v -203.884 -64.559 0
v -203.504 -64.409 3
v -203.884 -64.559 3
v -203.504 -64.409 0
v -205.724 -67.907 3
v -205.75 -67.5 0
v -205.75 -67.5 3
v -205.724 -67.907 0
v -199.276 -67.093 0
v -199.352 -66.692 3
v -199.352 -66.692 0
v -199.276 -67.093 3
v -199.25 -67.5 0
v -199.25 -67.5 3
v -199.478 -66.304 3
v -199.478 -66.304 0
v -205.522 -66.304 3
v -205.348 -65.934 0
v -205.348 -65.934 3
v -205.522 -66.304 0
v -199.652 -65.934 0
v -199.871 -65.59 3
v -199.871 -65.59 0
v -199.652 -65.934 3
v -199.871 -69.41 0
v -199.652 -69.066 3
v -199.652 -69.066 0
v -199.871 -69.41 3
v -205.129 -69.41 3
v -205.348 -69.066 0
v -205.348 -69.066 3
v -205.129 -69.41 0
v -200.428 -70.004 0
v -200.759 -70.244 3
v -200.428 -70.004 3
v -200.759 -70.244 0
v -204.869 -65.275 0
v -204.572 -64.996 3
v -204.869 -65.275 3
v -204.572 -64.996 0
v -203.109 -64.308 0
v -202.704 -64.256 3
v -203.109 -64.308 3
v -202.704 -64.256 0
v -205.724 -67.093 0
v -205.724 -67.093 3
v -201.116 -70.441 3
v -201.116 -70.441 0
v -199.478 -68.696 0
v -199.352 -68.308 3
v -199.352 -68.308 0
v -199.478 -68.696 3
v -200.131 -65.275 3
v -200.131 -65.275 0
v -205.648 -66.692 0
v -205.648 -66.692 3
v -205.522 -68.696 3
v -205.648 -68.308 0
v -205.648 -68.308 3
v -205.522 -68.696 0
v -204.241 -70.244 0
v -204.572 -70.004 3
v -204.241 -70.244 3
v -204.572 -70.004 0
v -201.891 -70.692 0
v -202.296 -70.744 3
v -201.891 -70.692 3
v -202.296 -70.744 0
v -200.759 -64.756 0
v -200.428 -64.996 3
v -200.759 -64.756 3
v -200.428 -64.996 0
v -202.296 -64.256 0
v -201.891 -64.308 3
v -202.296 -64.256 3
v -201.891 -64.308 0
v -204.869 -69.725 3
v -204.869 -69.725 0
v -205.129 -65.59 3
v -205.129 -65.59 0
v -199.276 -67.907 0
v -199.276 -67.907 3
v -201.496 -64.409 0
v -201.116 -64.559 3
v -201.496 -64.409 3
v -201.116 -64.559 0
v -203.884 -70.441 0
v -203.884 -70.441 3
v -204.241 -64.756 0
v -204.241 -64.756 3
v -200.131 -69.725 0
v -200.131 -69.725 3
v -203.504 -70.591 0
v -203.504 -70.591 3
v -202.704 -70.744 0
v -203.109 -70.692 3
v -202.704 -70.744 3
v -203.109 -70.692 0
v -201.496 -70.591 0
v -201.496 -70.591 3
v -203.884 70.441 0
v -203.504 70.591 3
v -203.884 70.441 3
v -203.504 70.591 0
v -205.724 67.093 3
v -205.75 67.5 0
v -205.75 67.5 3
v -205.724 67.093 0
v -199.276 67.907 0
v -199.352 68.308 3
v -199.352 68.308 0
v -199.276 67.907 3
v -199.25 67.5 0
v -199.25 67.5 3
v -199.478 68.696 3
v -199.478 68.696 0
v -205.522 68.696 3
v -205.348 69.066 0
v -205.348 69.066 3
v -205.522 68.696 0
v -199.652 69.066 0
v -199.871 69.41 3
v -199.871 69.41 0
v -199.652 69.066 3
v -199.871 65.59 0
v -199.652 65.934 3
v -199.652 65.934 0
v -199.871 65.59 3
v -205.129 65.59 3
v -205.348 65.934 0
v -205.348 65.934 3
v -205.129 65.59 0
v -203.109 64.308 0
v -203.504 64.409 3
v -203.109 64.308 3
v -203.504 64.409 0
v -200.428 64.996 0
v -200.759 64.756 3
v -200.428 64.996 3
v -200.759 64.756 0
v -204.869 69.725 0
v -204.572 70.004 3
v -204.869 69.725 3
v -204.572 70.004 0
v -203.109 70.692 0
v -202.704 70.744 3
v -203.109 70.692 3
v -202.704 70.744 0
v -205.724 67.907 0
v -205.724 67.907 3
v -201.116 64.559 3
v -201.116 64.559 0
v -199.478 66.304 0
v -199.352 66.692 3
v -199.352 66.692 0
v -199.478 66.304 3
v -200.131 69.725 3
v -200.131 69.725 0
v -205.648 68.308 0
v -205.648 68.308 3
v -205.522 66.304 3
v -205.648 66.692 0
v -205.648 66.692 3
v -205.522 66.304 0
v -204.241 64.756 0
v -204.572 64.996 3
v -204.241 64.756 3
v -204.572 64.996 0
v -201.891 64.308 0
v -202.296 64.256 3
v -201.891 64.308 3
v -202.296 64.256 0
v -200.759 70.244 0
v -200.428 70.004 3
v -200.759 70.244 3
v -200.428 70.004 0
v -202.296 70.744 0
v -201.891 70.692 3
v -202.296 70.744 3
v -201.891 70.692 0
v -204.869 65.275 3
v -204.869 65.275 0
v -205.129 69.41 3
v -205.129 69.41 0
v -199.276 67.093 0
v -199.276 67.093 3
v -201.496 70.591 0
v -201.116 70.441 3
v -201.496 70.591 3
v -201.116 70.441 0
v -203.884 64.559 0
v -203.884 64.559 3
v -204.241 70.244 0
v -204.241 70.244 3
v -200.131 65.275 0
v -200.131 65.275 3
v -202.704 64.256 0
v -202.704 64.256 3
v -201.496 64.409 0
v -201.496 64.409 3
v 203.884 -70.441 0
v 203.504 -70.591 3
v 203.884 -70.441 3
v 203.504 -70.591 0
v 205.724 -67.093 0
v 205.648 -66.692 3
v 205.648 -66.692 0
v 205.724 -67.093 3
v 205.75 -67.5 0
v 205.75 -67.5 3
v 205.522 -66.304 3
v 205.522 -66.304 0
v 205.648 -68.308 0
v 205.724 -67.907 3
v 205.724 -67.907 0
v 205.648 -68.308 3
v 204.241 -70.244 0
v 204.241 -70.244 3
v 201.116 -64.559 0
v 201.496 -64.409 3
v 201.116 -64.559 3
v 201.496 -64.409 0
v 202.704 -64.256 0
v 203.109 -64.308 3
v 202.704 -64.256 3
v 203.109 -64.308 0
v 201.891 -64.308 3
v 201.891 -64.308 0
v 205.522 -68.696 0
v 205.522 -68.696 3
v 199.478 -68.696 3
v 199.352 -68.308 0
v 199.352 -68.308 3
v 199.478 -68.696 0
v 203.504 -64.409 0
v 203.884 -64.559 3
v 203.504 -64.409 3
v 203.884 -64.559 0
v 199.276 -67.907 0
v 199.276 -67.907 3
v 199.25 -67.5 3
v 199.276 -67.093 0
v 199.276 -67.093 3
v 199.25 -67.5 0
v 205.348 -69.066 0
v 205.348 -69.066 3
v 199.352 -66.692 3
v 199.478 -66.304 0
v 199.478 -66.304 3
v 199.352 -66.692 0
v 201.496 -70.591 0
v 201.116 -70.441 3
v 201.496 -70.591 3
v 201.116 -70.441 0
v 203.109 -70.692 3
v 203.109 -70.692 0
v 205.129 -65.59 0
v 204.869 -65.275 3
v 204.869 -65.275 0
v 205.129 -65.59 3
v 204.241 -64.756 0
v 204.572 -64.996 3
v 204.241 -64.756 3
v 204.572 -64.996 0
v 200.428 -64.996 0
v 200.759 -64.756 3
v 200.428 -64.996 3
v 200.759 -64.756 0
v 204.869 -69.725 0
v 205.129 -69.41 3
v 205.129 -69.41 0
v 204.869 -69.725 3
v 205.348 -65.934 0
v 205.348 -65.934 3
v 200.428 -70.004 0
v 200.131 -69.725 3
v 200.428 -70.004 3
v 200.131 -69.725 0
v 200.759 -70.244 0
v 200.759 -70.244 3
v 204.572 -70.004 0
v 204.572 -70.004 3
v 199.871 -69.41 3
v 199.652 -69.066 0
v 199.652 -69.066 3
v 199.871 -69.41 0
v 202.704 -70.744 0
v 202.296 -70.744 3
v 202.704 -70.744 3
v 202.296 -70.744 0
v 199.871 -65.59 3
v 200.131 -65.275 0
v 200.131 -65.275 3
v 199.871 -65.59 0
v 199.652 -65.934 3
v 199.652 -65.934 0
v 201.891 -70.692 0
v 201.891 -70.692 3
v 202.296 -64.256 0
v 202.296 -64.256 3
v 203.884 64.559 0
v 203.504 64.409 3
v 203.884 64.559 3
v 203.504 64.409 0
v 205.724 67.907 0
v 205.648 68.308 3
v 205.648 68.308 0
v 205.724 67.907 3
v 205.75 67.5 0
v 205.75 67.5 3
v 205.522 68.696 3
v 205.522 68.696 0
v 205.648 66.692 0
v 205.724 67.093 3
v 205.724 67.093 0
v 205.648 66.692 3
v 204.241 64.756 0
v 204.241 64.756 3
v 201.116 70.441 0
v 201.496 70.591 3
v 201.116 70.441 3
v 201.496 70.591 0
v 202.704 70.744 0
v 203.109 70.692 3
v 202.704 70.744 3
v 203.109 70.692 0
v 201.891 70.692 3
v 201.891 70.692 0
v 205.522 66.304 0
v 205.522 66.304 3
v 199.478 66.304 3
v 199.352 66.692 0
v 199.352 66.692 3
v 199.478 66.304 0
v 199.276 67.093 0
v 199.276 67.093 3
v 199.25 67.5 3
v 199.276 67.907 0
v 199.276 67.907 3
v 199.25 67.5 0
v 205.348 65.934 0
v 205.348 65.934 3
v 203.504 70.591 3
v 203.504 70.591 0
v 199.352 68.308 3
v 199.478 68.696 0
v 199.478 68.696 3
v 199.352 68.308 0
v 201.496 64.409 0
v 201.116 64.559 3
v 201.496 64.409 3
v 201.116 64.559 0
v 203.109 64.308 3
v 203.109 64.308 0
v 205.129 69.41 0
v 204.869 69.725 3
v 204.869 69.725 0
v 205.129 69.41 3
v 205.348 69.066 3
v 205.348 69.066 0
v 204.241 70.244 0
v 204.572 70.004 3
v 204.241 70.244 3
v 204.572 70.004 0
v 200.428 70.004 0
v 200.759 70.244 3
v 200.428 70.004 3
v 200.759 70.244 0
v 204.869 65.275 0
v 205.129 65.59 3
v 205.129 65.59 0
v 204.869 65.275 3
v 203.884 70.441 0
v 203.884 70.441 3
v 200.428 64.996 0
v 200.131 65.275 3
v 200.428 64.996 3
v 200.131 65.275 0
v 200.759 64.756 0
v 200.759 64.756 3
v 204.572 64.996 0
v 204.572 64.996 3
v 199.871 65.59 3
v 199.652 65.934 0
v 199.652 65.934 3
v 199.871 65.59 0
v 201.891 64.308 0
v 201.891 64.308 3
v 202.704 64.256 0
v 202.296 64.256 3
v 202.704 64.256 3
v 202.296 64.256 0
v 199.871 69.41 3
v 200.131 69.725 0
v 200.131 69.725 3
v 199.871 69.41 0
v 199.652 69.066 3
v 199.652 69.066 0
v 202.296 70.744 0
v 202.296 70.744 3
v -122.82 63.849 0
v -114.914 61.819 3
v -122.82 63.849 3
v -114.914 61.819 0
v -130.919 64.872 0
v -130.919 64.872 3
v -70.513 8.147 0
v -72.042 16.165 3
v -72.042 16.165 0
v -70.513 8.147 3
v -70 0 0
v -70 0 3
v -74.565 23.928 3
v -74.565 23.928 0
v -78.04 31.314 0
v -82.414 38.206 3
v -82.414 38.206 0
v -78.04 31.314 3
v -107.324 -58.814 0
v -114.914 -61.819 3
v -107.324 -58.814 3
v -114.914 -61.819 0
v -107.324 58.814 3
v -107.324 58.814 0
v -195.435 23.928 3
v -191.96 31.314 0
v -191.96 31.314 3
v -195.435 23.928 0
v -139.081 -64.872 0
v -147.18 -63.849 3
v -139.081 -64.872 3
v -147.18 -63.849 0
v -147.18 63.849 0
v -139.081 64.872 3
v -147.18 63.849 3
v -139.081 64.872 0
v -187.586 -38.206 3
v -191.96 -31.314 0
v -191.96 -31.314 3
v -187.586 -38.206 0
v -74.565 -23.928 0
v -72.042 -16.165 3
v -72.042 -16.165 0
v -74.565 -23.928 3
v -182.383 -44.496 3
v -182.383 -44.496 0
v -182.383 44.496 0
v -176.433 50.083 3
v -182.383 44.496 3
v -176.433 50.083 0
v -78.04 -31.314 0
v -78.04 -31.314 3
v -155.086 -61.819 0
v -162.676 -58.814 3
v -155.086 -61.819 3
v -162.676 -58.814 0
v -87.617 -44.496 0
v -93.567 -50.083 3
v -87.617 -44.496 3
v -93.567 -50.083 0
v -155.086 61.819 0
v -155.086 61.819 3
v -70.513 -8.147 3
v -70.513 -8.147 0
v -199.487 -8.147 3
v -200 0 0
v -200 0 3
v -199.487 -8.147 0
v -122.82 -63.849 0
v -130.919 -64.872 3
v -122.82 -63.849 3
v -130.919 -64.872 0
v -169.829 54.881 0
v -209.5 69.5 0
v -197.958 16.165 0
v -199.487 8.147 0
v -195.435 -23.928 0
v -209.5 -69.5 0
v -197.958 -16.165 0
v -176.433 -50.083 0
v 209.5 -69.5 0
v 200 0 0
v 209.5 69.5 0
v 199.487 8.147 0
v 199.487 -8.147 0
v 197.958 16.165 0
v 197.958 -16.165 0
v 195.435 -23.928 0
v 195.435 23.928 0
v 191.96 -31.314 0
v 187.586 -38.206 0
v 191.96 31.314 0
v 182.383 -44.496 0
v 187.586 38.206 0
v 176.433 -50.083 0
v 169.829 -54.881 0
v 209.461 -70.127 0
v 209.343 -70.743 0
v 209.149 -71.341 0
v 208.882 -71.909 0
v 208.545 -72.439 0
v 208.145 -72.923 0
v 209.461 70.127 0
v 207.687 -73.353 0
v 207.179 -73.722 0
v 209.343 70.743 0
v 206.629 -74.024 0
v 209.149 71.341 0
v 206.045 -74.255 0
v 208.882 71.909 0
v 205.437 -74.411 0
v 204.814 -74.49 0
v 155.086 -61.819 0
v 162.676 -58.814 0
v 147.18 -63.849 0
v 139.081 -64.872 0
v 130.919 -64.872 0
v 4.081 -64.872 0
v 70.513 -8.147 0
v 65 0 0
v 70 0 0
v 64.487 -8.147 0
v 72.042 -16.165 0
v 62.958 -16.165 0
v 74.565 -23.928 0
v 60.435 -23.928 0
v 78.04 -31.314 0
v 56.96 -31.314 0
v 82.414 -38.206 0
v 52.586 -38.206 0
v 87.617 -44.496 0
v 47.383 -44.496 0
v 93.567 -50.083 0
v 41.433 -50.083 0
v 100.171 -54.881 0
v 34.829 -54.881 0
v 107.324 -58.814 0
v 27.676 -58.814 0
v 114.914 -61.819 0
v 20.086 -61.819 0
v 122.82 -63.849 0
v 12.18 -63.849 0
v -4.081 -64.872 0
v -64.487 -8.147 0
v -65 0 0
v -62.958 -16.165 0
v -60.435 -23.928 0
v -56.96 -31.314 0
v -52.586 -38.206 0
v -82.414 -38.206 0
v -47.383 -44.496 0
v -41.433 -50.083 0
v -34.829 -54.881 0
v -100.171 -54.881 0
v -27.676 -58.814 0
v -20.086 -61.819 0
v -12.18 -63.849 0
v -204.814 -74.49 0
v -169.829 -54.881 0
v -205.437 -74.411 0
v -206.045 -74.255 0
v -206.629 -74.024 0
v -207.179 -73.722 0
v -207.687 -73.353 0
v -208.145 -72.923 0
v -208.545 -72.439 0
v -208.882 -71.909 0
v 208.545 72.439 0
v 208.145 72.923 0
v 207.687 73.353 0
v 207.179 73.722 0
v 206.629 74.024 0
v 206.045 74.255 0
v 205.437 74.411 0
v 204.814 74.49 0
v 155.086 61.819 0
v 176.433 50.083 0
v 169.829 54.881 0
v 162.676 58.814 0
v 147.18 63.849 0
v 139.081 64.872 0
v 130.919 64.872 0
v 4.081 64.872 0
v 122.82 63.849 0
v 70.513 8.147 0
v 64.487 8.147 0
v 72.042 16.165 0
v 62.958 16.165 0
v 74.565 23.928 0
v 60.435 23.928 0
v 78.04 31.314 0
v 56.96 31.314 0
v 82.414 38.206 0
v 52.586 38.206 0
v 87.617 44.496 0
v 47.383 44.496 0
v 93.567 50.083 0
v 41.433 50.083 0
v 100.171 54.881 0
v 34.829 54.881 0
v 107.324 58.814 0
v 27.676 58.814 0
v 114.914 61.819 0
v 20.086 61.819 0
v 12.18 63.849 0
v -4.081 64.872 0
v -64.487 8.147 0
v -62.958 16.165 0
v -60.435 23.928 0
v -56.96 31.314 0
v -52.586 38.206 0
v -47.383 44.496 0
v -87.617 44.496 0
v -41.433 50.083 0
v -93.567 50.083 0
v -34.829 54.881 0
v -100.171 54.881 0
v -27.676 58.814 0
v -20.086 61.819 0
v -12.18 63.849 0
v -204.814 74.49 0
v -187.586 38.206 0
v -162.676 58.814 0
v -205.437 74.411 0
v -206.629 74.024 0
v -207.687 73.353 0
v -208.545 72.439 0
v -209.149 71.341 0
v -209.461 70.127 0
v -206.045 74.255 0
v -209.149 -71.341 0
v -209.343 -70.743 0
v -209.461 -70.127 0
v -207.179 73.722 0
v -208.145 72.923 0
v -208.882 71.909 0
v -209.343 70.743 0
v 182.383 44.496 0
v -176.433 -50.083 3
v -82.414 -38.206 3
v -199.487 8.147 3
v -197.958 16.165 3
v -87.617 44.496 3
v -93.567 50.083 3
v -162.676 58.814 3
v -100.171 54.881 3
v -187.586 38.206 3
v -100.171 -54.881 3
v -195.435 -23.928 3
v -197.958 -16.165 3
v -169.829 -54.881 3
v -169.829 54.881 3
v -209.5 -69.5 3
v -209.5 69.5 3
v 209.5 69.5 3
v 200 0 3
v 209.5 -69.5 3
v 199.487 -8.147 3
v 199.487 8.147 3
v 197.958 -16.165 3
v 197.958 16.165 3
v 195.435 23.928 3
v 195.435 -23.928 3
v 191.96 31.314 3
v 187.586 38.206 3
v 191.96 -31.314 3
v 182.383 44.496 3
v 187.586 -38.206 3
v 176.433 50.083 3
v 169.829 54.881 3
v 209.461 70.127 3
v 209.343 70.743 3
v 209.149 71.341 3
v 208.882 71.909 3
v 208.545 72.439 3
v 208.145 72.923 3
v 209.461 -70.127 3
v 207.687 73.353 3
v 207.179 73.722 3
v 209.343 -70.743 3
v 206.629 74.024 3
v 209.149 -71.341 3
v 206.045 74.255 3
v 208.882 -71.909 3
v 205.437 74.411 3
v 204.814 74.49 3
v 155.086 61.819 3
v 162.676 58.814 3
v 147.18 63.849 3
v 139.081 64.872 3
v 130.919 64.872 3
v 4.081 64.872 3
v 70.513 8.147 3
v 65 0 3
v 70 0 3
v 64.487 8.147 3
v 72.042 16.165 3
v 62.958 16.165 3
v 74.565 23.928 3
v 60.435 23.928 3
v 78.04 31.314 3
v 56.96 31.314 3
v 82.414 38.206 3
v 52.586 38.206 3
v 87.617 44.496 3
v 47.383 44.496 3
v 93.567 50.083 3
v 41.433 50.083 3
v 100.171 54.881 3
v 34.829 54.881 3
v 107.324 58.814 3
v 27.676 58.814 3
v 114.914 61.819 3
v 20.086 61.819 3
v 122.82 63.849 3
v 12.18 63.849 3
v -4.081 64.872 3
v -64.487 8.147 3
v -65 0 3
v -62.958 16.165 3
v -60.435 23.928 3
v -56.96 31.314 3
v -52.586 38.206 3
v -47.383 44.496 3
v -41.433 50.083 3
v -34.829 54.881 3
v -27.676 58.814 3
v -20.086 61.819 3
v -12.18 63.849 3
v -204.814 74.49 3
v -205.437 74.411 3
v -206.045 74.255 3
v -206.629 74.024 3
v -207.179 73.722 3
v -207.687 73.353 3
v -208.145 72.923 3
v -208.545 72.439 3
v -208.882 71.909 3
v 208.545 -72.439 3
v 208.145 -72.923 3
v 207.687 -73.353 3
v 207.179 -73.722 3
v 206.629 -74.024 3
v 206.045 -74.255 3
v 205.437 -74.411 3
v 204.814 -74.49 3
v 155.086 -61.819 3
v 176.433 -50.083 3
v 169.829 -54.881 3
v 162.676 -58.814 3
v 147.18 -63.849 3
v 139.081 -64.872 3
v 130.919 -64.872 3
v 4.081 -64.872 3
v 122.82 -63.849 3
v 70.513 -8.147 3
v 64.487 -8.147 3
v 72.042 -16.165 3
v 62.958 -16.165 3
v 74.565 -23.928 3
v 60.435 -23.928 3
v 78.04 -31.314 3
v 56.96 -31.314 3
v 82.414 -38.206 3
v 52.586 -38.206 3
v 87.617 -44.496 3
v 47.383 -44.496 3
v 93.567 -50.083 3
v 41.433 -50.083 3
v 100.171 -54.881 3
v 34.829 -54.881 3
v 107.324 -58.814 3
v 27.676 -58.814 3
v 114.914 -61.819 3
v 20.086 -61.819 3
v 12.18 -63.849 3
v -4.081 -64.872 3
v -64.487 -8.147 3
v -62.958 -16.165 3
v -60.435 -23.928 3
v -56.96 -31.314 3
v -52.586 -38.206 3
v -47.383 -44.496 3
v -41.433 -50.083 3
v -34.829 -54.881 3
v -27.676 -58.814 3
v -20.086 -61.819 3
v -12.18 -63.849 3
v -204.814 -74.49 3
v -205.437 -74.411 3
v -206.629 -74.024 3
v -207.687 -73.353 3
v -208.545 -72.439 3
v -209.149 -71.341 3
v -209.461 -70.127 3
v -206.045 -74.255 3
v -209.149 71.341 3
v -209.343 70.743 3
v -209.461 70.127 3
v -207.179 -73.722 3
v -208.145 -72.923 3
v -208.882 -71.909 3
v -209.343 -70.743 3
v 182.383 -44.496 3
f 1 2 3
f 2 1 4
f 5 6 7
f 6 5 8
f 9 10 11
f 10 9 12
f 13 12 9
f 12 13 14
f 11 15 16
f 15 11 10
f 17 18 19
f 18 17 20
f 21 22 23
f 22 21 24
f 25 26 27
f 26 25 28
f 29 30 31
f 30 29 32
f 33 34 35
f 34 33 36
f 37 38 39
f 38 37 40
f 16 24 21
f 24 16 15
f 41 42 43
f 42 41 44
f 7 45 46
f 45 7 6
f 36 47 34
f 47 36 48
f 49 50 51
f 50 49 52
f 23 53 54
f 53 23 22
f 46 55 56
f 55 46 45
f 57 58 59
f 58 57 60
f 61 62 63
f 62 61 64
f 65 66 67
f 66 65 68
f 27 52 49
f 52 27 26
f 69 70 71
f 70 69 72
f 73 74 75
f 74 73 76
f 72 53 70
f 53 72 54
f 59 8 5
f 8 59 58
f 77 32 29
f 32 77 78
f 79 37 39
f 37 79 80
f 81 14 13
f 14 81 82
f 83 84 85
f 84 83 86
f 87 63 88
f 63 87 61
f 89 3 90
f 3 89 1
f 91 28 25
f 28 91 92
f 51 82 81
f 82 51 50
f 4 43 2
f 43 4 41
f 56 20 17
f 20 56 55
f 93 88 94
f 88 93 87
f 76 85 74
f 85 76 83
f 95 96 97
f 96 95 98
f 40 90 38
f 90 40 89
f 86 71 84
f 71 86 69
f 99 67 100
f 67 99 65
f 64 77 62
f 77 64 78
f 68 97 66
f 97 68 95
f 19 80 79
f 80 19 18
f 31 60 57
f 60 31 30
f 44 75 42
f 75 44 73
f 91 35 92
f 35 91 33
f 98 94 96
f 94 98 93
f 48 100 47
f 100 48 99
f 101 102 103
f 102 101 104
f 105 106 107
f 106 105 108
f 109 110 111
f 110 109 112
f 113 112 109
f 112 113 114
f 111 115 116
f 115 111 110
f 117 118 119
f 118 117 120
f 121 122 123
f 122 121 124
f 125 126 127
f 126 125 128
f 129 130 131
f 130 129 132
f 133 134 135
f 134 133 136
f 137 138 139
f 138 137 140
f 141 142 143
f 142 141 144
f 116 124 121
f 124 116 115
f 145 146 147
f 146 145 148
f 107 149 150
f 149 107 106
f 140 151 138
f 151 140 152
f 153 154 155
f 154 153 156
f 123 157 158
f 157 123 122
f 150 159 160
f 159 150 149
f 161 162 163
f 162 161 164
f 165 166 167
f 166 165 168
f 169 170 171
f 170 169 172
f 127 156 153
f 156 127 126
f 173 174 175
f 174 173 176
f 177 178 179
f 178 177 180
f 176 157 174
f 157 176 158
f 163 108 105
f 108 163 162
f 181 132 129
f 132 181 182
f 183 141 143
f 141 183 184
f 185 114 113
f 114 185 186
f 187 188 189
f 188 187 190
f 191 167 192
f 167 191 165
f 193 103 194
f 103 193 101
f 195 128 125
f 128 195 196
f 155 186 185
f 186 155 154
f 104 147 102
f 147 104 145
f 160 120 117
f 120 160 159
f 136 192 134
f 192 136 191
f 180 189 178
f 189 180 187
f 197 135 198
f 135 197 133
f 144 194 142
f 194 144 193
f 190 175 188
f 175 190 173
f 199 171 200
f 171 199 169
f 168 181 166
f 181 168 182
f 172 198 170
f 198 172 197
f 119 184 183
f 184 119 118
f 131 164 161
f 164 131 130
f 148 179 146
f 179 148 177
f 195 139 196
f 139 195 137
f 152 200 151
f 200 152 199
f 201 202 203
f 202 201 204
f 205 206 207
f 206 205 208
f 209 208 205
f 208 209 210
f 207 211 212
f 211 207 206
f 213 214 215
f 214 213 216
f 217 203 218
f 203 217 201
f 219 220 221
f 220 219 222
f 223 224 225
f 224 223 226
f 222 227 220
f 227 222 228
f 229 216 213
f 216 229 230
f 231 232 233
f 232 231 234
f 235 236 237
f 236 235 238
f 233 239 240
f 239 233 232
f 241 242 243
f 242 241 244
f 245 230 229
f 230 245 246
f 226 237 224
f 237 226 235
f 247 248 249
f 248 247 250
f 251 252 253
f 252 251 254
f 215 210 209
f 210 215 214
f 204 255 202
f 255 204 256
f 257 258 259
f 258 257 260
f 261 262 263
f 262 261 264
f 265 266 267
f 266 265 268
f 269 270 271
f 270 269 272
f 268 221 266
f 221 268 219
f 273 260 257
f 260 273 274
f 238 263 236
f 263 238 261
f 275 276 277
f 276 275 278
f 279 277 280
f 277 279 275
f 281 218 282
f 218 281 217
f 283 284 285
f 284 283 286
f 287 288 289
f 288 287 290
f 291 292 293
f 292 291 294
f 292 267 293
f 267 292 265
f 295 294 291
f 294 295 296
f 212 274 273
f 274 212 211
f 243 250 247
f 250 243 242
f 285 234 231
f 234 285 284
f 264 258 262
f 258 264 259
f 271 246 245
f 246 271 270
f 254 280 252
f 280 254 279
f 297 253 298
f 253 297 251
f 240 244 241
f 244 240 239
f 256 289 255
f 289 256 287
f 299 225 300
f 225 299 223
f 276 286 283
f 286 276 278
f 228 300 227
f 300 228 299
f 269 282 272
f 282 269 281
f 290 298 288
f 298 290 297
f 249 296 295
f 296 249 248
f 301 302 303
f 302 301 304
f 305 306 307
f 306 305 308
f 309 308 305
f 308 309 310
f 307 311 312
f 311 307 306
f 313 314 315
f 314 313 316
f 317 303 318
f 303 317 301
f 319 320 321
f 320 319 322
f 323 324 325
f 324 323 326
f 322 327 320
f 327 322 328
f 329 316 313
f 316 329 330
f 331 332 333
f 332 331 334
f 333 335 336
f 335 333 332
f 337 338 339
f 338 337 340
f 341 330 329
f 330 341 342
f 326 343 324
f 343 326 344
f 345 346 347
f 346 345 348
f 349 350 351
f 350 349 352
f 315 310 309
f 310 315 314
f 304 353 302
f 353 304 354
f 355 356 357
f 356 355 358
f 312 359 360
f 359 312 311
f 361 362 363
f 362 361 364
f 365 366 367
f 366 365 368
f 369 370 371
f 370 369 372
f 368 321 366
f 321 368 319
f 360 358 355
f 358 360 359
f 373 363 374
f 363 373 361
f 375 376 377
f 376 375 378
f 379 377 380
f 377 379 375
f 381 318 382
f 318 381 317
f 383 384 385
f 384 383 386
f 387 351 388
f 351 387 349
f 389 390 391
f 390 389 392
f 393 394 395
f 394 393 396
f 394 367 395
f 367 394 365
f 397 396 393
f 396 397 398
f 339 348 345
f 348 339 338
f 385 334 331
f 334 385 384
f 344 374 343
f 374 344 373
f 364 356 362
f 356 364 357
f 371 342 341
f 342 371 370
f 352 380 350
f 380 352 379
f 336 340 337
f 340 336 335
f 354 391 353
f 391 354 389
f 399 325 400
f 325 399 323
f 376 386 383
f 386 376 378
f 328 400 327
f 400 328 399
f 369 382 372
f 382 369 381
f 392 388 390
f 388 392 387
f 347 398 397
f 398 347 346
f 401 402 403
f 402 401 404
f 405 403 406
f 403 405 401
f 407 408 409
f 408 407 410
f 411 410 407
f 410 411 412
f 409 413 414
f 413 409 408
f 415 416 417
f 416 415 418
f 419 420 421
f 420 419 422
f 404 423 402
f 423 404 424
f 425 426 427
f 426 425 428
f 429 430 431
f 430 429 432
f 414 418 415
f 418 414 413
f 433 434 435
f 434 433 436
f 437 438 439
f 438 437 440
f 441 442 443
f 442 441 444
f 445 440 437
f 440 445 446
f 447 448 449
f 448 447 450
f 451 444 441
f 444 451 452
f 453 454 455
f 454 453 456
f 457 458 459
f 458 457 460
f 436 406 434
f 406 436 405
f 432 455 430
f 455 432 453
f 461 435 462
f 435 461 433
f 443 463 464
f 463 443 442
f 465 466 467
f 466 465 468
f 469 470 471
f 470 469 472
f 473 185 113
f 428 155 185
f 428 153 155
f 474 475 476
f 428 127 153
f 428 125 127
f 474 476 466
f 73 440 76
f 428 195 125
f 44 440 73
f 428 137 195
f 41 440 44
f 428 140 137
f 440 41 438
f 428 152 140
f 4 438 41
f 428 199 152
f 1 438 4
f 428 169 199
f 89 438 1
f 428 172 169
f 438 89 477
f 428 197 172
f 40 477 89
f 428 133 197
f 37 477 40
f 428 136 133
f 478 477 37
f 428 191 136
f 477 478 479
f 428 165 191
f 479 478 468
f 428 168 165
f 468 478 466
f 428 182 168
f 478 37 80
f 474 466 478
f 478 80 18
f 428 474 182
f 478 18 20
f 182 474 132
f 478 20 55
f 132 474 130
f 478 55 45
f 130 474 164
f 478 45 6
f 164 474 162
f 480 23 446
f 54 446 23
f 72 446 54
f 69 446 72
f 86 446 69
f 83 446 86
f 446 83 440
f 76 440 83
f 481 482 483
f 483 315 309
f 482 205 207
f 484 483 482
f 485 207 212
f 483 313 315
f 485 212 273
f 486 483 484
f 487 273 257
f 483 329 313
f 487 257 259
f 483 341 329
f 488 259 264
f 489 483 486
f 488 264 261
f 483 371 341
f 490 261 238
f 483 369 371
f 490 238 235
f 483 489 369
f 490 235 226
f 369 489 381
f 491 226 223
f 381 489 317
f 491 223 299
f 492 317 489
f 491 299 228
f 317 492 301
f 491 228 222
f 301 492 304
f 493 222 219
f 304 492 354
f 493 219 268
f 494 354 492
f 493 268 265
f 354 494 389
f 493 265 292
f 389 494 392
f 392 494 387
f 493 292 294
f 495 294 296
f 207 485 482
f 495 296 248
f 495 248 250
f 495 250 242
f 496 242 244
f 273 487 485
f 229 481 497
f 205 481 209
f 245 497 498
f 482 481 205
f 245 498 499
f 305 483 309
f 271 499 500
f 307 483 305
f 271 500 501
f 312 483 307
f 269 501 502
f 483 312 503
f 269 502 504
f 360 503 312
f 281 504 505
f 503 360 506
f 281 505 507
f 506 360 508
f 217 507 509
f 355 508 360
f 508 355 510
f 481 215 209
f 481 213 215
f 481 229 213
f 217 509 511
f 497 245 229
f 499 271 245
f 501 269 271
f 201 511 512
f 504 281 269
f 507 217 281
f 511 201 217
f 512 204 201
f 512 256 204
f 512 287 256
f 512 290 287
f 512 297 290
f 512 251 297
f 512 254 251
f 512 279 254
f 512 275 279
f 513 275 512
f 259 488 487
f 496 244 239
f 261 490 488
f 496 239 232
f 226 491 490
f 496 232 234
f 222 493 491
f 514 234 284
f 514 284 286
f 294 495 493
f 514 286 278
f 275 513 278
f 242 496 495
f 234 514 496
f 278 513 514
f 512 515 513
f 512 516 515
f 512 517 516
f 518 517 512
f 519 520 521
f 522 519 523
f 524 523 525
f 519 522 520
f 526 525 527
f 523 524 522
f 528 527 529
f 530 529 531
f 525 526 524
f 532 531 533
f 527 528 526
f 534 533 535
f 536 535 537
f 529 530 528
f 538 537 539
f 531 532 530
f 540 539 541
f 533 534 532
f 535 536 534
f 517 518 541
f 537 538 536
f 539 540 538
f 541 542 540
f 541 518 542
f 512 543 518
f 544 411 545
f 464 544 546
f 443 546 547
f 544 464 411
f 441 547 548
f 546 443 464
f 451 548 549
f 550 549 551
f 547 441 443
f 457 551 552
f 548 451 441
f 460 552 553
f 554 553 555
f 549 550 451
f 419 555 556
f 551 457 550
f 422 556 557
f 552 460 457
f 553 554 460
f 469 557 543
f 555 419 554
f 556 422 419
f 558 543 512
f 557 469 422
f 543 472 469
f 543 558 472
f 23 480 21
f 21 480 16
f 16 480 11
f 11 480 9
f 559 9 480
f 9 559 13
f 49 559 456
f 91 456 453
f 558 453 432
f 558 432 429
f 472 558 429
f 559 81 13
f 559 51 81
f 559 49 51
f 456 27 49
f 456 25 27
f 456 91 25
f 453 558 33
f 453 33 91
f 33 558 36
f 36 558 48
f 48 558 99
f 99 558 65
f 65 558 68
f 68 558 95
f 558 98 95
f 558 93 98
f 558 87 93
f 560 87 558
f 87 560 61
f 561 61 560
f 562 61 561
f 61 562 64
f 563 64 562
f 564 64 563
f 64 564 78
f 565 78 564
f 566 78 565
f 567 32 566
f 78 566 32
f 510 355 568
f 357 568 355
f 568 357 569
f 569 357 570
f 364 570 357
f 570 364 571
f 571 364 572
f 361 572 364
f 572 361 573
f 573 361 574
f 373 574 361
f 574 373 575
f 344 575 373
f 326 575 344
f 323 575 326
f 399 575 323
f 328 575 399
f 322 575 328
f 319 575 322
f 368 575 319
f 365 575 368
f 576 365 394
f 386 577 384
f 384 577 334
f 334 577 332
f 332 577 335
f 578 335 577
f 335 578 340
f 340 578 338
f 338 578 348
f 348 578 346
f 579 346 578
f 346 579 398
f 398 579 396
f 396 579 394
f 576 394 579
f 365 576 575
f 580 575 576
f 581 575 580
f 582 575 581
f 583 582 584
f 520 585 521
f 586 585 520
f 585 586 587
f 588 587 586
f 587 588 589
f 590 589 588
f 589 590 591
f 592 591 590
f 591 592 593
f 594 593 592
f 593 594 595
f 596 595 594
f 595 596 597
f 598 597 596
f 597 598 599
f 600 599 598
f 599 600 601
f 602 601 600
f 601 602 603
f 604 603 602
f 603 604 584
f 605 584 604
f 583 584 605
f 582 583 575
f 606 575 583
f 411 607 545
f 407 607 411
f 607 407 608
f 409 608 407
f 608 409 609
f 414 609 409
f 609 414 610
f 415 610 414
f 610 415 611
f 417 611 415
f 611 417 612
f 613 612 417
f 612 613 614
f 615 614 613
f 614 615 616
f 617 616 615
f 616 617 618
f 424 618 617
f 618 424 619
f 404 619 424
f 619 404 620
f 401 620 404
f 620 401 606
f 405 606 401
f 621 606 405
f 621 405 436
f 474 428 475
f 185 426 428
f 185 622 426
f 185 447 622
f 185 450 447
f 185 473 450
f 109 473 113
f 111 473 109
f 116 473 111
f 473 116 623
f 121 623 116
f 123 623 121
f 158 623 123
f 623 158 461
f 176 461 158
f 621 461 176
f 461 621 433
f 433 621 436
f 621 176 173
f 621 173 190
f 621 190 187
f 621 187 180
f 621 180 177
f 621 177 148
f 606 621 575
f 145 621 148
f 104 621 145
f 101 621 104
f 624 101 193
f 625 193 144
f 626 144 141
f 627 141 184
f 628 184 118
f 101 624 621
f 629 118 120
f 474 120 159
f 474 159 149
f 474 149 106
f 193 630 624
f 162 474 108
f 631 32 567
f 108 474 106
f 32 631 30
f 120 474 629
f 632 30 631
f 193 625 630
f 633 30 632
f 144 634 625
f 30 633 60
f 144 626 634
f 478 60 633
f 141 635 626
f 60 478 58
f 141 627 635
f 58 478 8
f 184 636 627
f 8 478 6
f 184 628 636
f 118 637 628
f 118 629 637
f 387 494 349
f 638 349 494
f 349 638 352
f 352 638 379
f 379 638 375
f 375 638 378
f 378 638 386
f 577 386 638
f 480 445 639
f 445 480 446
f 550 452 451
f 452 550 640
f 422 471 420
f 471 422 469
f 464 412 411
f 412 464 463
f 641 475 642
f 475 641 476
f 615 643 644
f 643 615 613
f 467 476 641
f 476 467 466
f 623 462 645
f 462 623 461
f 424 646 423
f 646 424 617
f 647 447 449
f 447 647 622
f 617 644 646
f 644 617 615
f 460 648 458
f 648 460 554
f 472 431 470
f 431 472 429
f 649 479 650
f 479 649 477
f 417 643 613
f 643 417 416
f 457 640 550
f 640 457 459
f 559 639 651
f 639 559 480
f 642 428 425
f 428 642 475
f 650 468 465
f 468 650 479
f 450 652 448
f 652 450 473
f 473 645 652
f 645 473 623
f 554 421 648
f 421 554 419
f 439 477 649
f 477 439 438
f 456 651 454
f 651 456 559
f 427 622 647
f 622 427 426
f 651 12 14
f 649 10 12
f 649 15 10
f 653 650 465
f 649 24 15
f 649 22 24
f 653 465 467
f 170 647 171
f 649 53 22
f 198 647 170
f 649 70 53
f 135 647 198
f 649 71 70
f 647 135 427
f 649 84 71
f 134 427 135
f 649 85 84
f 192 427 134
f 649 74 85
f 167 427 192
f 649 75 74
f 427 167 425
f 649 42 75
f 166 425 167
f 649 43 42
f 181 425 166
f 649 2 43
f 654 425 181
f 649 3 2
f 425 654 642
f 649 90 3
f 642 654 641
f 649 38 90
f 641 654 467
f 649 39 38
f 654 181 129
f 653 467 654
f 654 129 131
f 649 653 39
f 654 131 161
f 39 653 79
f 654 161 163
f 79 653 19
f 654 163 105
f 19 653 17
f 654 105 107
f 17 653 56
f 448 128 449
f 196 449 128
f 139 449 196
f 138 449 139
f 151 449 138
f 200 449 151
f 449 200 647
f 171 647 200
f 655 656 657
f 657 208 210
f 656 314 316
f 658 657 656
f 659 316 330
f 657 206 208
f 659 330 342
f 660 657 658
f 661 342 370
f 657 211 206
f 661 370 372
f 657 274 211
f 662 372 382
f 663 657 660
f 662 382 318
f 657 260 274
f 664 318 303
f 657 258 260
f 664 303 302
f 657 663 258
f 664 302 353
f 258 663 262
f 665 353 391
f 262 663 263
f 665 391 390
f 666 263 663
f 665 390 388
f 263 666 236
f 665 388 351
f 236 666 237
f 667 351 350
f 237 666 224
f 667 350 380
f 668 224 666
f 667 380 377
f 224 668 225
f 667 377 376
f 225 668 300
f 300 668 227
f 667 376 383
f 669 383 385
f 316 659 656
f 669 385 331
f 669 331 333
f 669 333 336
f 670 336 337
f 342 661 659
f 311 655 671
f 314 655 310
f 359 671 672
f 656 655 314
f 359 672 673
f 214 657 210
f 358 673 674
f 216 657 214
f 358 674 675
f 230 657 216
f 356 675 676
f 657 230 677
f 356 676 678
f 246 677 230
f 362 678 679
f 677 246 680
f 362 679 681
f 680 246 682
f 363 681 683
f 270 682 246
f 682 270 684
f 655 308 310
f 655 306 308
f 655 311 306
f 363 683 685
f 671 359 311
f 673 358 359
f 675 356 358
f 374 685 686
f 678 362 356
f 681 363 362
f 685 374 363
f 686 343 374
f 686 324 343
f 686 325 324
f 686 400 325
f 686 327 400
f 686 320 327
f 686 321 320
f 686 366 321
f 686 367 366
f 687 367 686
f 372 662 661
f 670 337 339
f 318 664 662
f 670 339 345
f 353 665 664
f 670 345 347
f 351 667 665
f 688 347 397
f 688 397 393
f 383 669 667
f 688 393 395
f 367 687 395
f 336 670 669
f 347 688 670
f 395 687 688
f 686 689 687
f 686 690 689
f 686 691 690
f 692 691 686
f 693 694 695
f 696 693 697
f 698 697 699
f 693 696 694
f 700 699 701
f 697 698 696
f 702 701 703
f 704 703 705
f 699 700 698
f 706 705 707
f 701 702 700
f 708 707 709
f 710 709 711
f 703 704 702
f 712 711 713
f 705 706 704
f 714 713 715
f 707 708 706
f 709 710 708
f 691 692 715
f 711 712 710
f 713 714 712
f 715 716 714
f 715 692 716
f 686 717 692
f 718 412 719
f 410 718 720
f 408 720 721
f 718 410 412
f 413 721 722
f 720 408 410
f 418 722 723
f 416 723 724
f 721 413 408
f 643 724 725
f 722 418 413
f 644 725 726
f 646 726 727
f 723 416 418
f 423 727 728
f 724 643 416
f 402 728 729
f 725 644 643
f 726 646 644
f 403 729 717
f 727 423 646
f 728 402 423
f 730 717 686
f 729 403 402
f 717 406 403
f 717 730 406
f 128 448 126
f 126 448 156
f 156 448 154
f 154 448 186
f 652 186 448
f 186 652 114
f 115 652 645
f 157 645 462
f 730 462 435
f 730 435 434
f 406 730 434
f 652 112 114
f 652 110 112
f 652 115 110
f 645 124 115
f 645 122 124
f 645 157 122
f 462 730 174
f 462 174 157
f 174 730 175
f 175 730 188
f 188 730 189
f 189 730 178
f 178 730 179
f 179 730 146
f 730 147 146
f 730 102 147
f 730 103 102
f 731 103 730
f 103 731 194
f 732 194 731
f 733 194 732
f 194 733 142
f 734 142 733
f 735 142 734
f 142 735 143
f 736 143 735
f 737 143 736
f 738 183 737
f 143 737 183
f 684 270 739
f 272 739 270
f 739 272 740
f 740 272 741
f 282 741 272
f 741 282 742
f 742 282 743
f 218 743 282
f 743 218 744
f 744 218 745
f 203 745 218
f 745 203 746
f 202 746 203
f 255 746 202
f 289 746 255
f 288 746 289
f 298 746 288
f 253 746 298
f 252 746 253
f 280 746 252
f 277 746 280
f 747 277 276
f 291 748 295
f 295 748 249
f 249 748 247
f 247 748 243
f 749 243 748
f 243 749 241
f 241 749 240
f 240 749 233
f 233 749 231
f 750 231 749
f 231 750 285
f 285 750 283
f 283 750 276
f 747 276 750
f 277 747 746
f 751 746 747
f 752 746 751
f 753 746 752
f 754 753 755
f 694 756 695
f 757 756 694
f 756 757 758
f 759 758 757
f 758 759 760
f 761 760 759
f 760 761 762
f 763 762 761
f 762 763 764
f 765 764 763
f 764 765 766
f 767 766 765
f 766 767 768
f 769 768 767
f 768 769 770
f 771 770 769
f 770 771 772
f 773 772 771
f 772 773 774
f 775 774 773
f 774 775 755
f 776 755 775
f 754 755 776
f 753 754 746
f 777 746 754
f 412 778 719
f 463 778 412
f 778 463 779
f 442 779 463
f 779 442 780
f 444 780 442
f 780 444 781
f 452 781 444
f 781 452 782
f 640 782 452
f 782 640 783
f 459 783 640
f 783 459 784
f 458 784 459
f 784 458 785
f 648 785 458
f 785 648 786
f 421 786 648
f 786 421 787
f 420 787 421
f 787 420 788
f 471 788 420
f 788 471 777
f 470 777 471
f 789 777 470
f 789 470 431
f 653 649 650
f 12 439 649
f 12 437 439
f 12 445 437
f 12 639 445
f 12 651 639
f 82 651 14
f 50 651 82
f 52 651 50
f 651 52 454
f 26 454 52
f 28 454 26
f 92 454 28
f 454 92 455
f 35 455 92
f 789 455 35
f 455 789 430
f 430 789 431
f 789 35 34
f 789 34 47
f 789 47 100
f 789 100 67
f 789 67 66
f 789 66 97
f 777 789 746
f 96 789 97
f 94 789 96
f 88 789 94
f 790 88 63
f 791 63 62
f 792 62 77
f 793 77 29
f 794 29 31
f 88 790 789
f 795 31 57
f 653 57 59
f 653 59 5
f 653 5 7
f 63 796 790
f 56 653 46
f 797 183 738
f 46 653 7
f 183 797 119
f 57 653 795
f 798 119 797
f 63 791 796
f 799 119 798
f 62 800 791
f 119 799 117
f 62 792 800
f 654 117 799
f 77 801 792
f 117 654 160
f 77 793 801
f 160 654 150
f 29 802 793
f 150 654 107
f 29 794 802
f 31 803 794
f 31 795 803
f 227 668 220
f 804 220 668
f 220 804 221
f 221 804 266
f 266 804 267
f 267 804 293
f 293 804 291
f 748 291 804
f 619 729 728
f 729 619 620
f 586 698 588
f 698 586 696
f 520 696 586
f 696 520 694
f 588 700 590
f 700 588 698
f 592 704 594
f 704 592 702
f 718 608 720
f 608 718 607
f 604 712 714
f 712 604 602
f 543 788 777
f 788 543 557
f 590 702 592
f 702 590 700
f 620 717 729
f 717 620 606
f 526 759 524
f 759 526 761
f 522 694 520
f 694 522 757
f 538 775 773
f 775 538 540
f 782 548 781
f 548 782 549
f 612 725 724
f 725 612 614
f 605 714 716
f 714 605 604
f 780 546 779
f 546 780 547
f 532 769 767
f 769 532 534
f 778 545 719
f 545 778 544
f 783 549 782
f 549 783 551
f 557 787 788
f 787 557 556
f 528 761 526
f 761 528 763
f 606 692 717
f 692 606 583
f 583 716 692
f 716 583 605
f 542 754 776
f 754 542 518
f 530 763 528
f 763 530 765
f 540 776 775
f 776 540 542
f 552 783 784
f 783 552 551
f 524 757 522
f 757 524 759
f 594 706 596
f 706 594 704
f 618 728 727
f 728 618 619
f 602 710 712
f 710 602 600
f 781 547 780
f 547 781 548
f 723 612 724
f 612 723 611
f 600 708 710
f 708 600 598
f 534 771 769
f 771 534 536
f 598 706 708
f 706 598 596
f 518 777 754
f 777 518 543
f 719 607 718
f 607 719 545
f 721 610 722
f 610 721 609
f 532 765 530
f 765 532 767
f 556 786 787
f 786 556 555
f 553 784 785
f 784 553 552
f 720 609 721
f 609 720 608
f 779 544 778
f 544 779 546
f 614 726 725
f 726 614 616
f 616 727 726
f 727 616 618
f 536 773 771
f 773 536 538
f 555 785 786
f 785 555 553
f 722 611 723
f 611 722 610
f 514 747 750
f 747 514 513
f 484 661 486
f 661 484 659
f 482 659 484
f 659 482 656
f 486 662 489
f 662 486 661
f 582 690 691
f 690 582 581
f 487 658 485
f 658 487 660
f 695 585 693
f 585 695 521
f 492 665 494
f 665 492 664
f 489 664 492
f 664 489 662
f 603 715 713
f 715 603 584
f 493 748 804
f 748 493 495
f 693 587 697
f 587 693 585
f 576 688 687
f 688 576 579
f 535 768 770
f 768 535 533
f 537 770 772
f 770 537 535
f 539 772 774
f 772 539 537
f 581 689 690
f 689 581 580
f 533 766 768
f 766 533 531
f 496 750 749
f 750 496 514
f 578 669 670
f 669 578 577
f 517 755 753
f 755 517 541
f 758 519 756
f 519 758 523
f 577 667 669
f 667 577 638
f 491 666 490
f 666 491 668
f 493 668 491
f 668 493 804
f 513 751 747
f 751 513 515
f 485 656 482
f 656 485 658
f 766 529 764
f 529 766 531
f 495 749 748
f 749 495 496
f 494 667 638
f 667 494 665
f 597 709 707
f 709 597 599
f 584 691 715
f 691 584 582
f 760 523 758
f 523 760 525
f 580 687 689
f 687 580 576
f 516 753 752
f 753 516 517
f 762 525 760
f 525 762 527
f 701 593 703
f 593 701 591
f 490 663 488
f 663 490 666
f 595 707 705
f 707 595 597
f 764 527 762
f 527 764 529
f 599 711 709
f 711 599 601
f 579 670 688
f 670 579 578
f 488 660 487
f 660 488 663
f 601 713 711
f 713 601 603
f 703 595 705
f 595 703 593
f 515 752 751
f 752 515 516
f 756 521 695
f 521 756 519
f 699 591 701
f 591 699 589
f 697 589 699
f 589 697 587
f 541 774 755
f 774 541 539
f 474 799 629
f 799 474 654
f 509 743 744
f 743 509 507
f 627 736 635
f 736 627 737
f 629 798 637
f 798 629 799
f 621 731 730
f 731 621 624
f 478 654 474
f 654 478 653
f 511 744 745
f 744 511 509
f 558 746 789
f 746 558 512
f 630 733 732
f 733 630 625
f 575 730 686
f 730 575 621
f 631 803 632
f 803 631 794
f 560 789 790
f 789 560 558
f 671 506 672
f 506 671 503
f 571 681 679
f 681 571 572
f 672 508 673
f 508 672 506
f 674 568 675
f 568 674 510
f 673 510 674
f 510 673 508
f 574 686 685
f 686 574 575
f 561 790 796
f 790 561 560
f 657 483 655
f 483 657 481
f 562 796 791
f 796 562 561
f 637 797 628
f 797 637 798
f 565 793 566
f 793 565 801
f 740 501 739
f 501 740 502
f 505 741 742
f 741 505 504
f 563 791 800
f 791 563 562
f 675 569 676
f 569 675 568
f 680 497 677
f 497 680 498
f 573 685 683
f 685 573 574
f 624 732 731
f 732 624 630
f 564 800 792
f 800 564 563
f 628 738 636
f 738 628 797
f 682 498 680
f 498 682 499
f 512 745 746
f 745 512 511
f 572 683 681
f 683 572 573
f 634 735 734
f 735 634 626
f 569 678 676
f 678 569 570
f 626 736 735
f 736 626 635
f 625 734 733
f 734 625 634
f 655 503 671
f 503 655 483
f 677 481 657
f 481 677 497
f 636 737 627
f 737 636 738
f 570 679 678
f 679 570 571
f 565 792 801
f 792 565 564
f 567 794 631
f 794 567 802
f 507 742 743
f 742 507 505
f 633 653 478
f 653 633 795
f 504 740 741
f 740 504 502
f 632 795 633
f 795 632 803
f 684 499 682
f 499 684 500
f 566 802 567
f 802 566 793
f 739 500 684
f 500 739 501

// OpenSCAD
$fn = 50;

difference() {
	union() {
		hull() {
			translate(v = [-204.5, 69.5, 0]) {
				cylinder(h = 3, r = 5);
			}
			translate(v = [204.5, 69.5, 0]) {
				cylinder(h = 3, r = 5);
			}
			translate(v = [-204.5, -69.5, 0]) {
				cylinder(h = 3, r = 5);
			}
			translate(v = [204.5, -69.5, 0]) {
				cylinder(h = 3, r = 5);
			}
		}
	}
	union() {
		translate(v = [-202.5, -67.5, -100.0]) {
			cylinder(h = 200, r = 3.25);
		}
		translate(v = [-202.5, 67.5, -100.0]) {
			cylinder(h = 200, r = 3.25);
		}
		translate(v = [202.5, -67.5, -100.0]) {
			cylinder(h = 200, r = 3.25);
		}
		translate(v = [202.5, 67.5, -100.0]) {
			cylinder(h = 200, r = 3.25);
		}
		translate(v = [-202.5, -67.5, -100.0]) {
			cylinder(h = 200, r = 1.8);
		}
		translate(v = [-202.5, 67.5, -100.0]) {
			cylinder(h = 200, r = 1.8);
		}
		translate(v = [202.5, -67.5, -100.0]) {
			cylinder(h = 200, r = 1.8);
		}
		translate(v = [202.5, 67.5, -100.0]) {
			cylinder(h = 200, r = 1.8);
		}
		translate(v = [-135.0, 0, 0.0]) {
			cylinder(h = 3, r = 65.0);
		}
		cylinder(h = 3, r = 65.0);
		translate(v = [135.0, 0, 0.0]) {
			cylinder(h = 3, r = 65.0);
		}
	}
}
